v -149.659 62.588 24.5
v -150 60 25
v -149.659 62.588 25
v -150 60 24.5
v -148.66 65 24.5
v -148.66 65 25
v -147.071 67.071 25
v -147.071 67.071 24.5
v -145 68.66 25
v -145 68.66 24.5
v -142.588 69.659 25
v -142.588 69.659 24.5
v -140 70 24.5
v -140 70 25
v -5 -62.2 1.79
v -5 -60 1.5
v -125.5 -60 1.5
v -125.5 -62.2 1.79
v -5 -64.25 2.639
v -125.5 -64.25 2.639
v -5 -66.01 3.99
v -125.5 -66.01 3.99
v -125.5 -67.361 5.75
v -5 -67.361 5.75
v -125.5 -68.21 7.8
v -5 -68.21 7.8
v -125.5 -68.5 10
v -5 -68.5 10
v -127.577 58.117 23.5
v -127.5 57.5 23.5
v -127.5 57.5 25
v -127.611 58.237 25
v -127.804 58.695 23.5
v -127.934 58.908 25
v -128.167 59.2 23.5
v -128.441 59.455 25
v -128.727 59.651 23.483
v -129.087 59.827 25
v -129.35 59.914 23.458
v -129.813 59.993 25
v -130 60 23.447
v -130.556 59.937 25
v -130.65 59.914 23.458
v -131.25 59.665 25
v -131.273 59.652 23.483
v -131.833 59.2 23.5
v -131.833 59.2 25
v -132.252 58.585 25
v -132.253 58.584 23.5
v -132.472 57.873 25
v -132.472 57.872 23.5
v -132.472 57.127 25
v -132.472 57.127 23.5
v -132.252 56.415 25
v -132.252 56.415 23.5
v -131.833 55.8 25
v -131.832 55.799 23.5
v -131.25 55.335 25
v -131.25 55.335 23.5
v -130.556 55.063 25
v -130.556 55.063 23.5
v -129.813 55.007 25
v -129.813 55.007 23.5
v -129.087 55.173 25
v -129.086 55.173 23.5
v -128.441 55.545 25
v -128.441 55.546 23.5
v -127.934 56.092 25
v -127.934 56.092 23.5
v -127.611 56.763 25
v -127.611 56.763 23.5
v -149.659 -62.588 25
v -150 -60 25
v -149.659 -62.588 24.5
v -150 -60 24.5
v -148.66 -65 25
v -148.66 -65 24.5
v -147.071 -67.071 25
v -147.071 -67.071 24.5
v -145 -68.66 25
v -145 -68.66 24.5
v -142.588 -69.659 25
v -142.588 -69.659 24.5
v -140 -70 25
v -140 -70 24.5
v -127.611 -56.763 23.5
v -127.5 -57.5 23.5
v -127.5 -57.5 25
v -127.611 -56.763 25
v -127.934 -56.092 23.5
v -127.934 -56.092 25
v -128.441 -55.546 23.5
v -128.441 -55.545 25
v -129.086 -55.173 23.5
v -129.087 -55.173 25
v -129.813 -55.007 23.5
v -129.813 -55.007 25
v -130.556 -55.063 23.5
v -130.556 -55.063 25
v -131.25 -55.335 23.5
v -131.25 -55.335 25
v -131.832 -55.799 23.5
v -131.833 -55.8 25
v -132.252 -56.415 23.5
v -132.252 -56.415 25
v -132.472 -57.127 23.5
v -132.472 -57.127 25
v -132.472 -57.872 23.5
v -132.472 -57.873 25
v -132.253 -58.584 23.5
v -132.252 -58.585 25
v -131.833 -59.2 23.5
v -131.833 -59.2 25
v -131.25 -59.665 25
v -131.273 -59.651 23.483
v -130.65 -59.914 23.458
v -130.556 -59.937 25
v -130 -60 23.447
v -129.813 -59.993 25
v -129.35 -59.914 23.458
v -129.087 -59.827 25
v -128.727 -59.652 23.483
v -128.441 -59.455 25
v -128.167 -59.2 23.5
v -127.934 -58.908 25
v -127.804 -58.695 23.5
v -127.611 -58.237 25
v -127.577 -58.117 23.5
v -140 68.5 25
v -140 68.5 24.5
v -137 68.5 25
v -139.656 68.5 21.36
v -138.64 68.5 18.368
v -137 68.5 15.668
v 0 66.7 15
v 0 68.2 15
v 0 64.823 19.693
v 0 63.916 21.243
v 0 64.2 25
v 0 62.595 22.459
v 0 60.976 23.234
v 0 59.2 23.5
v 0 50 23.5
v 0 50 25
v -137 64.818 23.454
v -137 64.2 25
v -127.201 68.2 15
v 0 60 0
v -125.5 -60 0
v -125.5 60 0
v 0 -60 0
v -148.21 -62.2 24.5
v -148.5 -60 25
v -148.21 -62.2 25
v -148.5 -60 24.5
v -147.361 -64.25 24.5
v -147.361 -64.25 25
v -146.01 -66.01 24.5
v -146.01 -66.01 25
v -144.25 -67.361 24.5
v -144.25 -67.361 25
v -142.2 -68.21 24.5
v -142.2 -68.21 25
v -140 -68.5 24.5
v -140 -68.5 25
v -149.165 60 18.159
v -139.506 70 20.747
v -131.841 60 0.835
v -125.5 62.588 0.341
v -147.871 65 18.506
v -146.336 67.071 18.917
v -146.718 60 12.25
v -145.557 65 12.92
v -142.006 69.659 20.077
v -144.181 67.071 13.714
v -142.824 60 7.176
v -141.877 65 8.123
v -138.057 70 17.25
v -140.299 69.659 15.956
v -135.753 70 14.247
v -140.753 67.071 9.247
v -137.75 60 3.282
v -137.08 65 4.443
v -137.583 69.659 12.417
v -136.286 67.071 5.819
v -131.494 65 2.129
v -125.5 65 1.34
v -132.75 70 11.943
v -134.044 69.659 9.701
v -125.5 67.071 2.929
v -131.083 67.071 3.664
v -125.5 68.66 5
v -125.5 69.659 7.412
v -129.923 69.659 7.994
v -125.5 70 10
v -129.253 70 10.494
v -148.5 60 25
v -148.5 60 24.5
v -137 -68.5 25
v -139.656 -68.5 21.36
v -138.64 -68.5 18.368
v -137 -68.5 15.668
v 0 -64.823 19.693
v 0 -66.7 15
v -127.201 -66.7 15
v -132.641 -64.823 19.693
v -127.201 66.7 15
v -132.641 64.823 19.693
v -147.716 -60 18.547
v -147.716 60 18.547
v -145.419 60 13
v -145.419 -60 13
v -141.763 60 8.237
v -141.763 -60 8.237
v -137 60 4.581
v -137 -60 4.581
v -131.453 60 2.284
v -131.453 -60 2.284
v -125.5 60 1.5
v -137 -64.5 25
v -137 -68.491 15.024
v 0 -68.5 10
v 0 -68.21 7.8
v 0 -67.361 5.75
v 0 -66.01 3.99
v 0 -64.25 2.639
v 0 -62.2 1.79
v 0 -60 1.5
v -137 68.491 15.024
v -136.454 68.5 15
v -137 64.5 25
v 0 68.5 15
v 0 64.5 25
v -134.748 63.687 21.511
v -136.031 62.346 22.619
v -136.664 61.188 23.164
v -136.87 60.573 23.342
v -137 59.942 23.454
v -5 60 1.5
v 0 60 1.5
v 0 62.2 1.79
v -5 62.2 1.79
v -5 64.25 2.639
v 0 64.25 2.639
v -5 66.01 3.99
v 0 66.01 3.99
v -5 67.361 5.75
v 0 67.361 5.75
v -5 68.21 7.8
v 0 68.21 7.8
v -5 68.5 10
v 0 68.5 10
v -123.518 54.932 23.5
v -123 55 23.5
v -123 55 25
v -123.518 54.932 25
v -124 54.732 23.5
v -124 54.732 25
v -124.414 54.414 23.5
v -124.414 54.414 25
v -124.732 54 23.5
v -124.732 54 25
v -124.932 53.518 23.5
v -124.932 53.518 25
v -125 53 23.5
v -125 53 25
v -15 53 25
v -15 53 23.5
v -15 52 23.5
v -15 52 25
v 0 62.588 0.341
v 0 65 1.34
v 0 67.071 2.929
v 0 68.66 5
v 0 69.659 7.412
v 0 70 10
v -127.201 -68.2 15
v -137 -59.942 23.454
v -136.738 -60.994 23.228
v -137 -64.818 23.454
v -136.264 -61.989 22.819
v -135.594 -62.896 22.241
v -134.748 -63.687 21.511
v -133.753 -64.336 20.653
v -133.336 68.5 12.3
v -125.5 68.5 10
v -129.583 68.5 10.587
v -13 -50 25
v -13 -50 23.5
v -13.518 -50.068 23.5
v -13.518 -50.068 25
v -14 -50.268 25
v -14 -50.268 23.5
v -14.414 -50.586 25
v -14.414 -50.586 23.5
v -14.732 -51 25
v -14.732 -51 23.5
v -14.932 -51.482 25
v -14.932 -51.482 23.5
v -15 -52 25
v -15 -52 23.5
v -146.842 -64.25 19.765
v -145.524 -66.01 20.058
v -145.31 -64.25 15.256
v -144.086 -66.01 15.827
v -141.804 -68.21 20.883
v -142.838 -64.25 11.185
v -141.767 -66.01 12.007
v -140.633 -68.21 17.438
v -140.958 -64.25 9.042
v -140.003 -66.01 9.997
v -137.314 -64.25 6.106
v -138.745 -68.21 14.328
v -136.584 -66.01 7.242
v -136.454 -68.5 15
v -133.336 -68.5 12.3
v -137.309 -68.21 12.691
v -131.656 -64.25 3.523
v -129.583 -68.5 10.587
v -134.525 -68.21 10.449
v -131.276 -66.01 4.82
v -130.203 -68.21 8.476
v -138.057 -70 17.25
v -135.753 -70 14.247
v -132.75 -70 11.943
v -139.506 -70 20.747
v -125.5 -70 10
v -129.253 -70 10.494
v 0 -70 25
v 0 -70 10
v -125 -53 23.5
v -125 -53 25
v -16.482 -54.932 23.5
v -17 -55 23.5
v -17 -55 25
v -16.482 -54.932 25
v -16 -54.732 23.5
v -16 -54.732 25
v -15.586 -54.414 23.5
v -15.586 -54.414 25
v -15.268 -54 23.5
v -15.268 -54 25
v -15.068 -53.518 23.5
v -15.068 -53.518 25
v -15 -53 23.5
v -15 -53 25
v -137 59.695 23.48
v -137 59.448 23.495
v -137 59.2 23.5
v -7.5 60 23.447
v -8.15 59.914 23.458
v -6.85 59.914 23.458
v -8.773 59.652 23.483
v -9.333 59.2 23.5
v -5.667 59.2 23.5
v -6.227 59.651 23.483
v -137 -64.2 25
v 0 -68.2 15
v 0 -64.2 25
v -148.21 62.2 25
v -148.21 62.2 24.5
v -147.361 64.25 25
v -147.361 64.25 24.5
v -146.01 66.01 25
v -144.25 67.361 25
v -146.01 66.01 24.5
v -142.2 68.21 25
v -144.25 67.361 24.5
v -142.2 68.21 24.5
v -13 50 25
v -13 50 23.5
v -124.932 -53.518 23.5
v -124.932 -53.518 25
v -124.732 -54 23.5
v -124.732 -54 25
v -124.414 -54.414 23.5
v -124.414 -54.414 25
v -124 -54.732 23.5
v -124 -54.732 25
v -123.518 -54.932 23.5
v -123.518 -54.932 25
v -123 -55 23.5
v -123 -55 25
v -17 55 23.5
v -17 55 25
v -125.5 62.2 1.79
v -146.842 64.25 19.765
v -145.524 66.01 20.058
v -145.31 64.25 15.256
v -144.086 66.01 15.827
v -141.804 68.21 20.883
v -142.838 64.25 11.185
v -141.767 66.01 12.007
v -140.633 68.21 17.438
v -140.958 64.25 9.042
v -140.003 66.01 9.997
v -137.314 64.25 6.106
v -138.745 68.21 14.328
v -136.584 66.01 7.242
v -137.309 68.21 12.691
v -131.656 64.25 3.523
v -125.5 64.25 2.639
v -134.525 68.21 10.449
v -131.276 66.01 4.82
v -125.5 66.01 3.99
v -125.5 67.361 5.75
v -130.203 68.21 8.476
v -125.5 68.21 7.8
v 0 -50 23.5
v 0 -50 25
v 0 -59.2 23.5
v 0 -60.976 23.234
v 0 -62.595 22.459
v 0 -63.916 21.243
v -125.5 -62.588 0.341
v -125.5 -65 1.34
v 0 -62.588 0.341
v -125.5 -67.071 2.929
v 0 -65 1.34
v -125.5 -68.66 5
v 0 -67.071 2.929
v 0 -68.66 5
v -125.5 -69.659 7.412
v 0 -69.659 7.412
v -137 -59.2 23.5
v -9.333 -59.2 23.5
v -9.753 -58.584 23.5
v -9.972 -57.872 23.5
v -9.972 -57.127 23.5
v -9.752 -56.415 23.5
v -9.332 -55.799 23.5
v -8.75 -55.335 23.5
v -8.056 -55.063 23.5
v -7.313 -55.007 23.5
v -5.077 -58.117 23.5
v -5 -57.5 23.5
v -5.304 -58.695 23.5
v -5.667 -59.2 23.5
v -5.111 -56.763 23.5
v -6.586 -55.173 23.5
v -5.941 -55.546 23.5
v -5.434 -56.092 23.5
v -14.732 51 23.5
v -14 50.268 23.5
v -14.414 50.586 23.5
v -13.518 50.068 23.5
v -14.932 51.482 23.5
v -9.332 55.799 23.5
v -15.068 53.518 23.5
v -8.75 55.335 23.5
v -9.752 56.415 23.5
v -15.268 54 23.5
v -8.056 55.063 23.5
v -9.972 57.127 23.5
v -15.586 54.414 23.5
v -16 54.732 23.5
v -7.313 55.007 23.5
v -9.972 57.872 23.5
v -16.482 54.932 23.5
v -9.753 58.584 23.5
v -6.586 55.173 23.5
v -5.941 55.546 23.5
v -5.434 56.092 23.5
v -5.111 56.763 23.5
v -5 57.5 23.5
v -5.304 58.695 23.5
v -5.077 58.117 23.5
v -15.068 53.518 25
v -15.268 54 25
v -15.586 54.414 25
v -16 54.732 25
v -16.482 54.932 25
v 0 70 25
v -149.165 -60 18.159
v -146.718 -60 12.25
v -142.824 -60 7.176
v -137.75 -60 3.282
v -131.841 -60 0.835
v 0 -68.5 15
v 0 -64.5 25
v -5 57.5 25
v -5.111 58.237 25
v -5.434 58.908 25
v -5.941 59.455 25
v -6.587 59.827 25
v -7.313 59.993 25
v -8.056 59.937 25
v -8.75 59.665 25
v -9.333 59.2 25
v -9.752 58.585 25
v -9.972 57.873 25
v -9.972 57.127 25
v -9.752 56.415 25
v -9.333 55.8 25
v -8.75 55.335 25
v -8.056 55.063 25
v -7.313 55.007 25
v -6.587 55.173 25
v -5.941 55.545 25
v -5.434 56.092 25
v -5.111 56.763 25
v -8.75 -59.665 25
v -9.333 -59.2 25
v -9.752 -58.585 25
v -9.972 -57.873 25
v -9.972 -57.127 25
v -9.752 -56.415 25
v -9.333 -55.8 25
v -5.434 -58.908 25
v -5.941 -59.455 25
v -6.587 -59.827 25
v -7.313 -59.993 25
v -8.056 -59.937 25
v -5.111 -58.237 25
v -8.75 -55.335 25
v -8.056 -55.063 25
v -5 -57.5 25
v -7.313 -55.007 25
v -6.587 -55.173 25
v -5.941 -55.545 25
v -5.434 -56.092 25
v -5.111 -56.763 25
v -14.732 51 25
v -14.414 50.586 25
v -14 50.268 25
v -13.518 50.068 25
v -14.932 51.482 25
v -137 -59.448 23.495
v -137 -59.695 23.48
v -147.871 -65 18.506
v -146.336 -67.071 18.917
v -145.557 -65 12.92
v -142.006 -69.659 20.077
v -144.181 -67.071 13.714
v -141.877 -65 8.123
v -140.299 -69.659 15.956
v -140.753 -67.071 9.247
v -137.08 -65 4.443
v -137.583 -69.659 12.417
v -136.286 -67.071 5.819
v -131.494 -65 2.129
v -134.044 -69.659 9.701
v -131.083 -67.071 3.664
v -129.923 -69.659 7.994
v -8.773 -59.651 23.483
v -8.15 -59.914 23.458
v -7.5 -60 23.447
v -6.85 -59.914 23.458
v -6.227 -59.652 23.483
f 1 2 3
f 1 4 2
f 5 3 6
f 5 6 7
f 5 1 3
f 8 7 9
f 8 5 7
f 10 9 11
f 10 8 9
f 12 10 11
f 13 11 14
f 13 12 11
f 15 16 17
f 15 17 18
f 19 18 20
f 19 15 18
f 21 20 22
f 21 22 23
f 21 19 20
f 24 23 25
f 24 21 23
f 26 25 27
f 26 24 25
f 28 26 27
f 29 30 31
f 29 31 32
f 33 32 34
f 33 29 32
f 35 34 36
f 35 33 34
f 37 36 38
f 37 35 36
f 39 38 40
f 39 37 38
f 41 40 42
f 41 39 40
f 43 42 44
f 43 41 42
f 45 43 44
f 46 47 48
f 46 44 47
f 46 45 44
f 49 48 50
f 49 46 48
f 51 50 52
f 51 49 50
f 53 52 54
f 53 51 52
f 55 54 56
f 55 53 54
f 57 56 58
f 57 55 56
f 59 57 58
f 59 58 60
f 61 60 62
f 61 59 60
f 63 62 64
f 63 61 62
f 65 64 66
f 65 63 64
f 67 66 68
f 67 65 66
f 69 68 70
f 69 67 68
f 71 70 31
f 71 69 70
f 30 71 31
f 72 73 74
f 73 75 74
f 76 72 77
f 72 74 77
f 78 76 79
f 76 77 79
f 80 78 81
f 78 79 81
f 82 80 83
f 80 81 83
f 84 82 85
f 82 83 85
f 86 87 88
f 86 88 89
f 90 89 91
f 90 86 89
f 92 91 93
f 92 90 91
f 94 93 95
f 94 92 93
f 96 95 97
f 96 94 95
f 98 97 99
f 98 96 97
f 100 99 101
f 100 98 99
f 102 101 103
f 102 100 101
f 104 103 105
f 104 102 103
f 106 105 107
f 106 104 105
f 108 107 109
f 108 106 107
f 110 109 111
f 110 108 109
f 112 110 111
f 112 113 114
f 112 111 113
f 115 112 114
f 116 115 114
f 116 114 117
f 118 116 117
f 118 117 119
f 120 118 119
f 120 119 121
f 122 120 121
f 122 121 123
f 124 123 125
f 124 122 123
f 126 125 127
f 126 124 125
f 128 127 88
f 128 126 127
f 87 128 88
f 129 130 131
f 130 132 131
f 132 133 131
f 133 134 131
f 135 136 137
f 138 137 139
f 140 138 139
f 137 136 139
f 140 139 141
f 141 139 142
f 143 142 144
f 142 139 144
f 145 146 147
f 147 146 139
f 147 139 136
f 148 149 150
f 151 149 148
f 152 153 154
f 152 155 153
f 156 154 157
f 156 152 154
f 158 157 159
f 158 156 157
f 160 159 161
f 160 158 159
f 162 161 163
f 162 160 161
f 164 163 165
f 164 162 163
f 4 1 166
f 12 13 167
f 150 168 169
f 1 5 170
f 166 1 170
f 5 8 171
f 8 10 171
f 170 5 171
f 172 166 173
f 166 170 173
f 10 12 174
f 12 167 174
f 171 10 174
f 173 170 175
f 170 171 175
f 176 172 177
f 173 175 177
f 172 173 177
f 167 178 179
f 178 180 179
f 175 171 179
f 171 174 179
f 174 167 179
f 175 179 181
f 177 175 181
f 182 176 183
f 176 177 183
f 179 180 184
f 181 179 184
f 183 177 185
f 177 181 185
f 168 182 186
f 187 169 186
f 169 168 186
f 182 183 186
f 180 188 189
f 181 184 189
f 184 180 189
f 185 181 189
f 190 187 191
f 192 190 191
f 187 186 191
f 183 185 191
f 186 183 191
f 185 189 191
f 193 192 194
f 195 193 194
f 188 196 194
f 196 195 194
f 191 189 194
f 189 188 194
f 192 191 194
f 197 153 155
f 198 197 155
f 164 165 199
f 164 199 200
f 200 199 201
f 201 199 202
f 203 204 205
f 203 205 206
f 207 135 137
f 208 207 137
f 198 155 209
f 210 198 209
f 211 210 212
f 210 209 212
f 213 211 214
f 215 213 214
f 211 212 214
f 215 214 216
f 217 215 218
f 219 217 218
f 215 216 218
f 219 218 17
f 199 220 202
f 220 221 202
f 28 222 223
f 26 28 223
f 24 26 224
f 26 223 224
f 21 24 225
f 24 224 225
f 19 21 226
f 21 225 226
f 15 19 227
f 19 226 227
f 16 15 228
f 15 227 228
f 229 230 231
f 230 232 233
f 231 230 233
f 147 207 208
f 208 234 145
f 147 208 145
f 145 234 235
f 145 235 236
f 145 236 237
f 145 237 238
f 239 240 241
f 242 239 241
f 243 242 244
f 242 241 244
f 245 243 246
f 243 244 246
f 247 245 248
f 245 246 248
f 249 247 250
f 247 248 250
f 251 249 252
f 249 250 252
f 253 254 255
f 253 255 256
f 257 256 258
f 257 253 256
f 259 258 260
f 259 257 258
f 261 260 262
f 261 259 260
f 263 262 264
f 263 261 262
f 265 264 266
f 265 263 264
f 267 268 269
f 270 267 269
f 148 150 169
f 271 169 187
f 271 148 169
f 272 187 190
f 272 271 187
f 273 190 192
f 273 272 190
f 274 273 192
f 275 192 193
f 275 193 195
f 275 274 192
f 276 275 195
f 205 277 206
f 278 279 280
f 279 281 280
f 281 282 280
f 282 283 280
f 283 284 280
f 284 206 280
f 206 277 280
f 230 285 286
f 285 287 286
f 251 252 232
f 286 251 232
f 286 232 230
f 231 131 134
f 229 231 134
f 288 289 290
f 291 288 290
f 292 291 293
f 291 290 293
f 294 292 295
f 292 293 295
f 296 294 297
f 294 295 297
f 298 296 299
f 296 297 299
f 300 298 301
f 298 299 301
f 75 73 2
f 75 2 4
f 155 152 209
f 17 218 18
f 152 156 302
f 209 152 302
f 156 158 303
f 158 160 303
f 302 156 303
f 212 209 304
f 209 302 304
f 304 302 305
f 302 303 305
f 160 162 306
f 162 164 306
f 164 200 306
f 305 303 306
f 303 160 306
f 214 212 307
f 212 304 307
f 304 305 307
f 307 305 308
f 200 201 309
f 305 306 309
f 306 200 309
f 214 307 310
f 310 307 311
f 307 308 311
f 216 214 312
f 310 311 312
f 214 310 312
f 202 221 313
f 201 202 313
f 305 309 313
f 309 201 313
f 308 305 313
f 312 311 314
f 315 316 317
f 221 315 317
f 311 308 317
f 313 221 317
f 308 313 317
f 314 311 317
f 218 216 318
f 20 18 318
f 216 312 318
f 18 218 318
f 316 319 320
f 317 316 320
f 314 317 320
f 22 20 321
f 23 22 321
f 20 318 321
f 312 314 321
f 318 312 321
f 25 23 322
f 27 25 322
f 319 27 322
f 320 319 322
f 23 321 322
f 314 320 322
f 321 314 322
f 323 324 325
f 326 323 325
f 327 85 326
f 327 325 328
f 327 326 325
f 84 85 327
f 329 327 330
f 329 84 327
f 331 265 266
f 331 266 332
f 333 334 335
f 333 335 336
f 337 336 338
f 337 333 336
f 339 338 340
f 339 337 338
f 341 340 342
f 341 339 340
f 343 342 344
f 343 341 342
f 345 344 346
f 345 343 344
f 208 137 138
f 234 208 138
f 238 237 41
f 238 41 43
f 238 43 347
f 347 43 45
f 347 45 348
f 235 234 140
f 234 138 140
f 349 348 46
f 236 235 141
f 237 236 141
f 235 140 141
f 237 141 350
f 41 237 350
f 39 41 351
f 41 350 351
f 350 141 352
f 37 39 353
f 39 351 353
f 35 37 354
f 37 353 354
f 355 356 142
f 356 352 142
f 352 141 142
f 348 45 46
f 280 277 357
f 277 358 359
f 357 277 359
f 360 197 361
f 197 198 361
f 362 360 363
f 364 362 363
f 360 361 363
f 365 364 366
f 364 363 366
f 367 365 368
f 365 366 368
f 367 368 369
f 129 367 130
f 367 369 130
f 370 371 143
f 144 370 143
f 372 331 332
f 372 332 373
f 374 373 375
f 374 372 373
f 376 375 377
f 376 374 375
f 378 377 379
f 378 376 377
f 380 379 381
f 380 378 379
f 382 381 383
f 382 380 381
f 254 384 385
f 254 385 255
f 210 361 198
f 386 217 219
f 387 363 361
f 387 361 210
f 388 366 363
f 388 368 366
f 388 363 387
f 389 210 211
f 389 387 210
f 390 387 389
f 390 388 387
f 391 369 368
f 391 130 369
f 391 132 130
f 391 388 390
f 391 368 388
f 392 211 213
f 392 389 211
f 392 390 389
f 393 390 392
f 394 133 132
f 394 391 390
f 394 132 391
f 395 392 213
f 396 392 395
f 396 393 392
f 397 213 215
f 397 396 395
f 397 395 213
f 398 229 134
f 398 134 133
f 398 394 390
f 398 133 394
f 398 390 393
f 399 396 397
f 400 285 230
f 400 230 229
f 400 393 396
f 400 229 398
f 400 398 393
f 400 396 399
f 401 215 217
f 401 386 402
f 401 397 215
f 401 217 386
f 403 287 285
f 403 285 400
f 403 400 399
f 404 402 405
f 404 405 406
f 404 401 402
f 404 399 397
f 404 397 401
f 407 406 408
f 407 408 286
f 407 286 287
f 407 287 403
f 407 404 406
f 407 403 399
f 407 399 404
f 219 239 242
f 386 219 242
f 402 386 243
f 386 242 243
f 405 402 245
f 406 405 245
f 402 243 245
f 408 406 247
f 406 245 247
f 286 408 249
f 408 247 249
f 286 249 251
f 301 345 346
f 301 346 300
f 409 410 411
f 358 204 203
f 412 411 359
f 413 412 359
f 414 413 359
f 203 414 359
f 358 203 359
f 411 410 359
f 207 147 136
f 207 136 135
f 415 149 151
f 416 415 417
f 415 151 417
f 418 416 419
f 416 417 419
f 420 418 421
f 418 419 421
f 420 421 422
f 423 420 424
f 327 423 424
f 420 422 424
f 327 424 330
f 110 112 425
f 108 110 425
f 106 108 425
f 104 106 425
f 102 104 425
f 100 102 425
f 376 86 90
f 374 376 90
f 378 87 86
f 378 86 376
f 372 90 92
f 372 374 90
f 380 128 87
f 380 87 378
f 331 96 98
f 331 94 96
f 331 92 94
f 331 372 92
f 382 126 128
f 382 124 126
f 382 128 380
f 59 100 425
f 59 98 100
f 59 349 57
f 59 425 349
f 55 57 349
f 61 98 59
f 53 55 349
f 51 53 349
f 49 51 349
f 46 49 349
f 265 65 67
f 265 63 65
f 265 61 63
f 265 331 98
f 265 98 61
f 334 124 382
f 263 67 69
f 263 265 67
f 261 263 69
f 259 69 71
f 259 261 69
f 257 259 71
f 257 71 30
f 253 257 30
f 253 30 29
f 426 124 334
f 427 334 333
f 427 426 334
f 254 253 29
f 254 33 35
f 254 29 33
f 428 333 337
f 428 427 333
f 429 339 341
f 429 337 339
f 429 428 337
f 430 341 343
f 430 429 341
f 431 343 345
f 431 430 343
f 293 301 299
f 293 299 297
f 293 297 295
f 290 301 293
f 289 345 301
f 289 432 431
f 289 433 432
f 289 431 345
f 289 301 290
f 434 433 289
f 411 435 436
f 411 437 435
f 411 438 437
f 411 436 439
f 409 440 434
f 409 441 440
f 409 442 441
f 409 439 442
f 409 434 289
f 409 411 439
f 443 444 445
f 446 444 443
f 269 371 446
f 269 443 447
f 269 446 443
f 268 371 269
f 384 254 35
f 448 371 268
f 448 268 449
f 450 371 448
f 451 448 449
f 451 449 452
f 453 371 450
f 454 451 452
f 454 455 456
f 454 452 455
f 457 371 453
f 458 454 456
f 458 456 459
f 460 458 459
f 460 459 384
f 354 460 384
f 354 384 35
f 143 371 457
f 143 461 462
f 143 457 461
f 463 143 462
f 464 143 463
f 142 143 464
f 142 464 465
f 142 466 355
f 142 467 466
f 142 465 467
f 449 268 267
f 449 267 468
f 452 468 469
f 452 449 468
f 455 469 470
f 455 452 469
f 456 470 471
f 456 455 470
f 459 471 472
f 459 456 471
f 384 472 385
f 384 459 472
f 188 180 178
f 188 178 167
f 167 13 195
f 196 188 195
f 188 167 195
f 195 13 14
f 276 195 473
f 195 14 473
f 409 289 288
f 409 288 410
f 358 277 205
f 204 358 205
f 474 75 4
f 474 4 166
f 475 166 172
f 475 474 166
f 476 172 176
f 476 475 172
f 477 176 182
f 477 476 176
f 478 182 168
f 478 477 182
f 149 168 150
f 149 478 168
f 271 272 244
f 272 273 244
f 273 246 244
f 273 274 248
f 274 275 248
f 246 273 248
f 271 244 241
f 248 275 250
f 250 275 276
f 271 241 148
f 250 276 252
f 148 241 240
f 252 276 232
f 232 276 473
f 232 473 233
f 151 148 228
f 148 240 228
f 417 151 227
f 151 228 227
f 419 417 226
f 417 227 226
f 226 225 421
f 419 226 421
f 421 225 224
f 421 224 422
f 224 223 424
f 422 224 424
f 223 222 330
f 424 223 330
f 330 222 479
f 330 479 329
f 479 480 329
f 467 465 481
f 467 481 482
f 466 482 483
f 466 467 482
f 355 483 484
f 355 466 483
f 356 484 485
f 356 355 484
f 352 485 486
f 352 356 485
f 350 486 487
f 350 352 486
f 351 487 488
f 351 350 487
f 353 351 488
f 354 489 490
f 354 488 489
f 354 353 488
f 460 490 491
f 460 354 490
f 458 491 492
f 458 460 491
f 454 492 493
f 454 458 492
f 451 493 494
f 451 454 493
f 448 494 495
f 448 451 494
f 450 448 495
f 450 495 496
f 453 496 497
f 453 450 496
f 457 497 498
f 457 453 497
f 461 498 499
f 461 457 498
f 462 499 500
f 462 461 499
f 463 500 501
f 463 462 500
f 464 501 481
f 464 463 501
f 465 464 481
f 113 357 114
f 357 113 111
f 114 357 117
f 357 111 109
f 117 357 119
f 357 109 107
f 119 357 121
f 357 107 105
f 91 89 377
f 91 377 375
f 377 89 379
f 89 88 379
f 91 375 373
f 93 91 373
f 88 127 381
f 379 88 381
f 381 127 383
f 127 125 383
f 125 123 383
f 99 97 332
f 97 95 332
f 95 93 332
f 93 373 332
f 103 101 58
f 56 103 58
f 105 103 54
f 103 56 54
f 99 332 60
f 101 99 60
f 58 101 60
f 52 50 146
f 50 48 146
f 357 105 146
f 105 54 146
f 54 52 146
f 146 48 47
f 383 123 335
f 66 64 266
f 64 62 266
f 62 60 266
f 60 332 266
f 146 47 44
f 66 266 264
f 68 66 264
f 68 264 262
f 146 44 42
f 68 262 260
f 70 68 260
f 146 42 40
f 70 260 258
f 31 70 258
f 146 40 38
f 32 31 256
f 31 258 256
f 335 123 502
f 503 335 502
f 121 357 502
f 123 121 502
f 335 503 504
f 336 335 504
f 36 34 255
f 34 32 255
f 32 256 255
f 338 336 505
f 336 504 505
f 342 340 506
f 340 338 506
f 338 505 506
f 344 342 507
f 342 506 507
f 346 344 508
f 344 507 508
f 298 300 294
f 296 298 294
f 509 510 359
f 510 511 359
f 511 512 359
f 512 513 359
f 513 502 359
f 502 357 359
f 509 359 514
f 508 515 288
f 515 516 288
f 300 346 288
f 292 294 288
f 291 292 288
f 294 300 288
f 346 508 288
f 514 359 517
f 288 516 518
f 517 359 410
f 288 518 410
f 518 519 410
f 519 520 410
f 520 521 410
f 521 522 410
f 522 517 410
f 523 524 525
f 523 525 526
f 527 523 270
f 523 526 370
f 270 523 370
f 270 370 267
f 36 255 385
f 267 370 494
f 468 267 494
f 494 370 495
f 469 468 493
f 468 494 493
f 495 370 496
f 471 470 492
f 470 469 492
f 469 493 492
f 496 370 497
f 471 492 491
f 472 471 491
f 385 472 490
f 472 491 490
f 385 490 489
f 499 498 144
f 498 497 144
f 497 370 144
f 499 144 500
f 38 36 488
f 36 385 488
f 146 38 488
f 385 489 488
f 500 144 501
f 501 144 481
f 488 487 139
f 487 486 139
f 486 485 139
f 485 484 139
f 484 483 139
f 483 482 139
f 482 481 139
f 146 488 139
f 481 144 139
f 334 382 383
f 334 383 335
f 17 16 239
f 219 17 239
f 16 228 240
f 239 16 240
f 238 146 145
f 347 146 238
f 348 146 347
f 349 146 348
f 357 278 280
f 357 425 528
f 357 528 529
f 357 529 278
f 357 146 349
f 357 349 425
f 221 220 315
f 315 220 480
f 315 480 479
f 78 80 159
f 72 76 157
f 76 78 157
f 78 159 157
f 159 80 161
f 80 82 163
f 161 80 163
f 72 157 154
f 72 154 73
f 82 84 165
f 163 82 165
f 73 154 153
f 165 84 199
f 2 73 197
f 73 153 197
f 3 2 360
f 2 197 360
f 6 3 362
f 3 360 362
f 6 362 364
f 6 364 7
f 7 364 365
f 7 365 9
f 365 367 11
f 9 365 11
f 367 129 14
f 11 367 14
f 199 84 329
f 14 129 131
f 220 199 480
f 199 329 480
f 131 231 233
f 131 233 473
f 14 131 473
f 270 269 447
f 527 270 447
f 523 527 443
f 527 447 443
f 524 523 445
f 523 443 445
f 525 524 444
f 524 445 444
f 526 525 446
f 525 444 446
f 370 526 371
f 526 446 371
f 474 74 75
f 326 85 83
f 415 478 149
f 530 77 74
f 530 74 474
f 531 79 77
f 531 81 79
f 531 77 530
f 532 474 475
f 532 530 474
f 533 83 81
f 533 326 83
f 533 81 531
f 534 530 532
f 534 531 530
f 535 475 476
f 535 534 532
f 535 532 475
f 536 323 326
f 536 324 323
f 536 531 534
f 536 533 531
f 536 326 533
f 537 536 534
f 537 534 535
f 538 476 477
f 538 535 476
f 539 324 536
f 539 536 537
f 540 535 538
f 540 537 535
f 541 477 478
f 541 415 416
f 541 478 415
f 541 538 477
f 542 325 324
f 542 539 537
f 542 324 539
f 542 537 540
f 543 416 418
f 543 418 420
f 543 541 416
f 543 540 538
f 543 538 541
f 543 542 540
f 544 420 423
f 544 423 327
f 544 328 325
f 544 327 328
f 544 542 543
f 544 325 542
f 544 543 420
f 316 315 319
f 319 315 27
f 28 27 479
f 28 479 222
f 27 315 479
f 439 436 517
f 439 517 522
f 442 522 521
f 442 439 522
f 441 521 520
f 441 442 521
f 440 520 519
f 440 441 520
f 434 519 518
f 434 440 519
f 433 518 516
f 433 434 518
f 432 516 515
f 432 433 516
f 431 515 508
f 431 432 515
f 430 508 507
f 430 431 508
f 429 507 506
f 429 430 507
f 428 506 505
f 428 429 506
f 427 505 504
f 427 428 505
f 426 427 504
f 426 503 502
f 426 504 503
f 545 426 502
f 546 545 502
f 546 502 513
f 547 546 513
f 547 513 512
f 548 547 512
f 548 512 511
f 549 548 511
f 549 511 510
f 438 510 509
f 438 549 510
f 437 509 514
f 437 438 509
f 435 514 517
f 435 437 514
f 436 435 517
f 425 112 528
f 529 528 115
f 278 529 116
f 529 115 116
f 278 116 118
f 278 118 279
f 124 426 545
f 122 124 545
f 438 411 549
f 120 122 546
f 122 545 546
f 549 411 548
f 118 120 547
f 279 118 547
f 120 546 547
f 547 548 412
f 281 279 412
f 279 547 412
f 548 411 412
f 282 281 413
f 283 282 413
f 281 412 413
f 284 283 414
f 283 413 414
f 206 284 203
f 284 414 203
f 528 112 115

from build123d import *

# Parameters (mm, degrees)
PAD_DEPTH       = 70
FILLET_R        = 10
THICKNESS_T     = -1.5
SKETCH001_W     = 120
SKETCH001_H     = 25
POCKET_DEPTH    = 5
POCKET001_DEPTH = 5
PAD001_DEPTH    = 137
PAD002_DEPTH    = 137
POCKET002_DEPTH = 31
SKETCH007_R     = 2.5
POCKET003_DEPTH = 30
POCKET004_DEPTH = 100


with BuildPart() as body:
    # Sketch (on XZ_Plane of Origin) → Pad (new body, symmetric)
    with BuildSketch(Plane.XZ):
        with BuildLine():
            Line((0, 0), (0, 25))
            Line((0, 25), (-150, 25))
            Line((-150, 25), (-150, 24.5))
            ThreePointArc((-150, 24.5), (-142.824116, 7.175884), (-125.5, 0))
            Line((-125.5, 0), (0, 0))
        make_face()
    extrude(amount=PAD_DEPTH, both=True)

    # Fillet
    fillet_edges = [body.edges().sort_by_distance(p)[0] for p in [
        (-62.75, -70, 0),
        (-62.75, 70, 0),
    ]]
    fillet(fillet_edges, radius=FILLET_R)

    # Thickness
    thickness_openings = [body.faces().sort_by_distance(p)[0] for p in [
        (-74.850974, 0, 25),
    ]]
    offset(amount=THICKNESS_T, openings=thickness_openings)

    # Sketch001 → Pocket (cut)
    with BuildSketch(Plane.YZ):
        with Locations((0, 14)):
            Rectangle(SKETCH001_W, SKETCH001_H)
    extrude(amount=-POCKET_DEPTH, mode=Mode.SUBTRACT)

    # Sketch002 (on YZ_Plane of Origin) → Pocket001 (cut)
    with BuildSketch(Plane.YZ):
        with BuildLine():
            Line((-68.5, 26.5), (-68.5, 10))
            ThreePointArc((-68.5, 10), (-66.010408, 3.989592), (-60, 1.5))
            Line((-60, 1.5), (60, 1.5))
            ThreePointArc((60, 1.5), (66.010408, 3.989592), (68.5, 10))
            Line((68.5, 10), (68.5, 26.5))
            Line((68.5, 26.5), (-68.5, 26.5))
        make_face()
    extrude(amount=-POCKET001_DEPTH, mode=Mode.SUBTRACT)

    # Sketch004 → Pad001 (join)
    with BuildSketch(Plane.YZ):
        Polygon((-68.5, 25), (-64.5, 25), (-68.5, 15), align=None)
        Polygon((64.5, 25), (68.5, 25), (68.5, 15), align=None)
    extrude(amount=-PAD001_DEPTH)


with BuildPart() as mount:
    # Sketch005 (on YZ_Plane001 of Origin002) → Pad002 (new body)
    with BuildSketch(Plane.YZ):
        with BuildLine():
            Line((-68.2, 15), (-64.2, 25))
            Line((-64.2, 25), (-54.2, 25))
            Line((-54.2, 25), (54.2, 25))
            Line((54.2, 25), (64.2, 25))
            Line((64.2, 25), (68.2, 15))
            Line((68.2, 15), (66.7, 15))
            Line((66.7, 15), (64.822702, 19.693246))
            ThreePointArc((64.822702, 19.693246), (62.595076, 22.458803), (59.2, 23.5))
            Line((59.2, 23.5), (54.2, 23.5))
            Line((-54.2, 23.5), (54.2, 23.5))
            Line((-54.2, 23.5), (-59.2, 23.5))
            ThreePointArc((-59.2, 23.5), (-62.595076, 22.458803), (-64.822702, 19.693246))
            Line((-66.7, 15), (-64.822702, 19.693246))
            Line((-68.2, 15), (-66.7, 15))
        make_face()
    extrude(amount=-PAD002_DEPTH)

    # Sketch006 (on XY_Plane001 of Origin002) → Pocket002 (cut)
    with BuildSketch(Plane.XY):
        with BuildLine():
            Line((-17, 55), (-123, 55))
            ThreePointArc((-123, 55), (-124.414214, 54.414214), (-125, 53))
            Line((-125, 53), (-125, -53))
            ThreePointArc((-125, -53), (-124.414214, -54.414214), (-123, -55))
            Line((-123, -55), (-17, -55))
            ThreePointArc((-17, -55), (-15.585786, -54.414214), (-15, -53))
            Line((-15, -53), (-15, -52))
            ThreePointArc((-13, -50), (-14.414214, -50.585786), (-15, -52))
            Line((-13, -50), (0, -50))
            Line((0, -50), (0, 50))
            Line((-13, 50), (0, 50))
            ThreePointArc((-15, 52), (-14.414214, 50.585786), (-13, 50))
            Line((-15, 53), (-15, 52))
            ThreePointArc((-15, 53), (-15.585786, 54.414214), (-17, 55))
        make_face()
    extrude(amount=POCKET002_DEPTH, mode=Mode.SUBTRACT)

    # Sketch007 (on XY_Plane001 of Origin002) → Pocket003 (cut)
    with BuildSketch(Plane.XY):
        with Locations((-7.5, 57.5)):
            Circle(SKETCH007_R)
        with Locations((-130, 57.5)):
            Circle(SKETCH007_R)
        with Locations((-7.5, -57.5)):
            Circle(SKETCH007_R)
        with Locations((-130, -57.5)):
            Circle(SKETCH007_R)
    extrude(amount=POCKET003_DEPTH, mode=Mode.SUBTRACT)

    # Sketch008 (on XZ_Plane001 of Origin002) → Pocket004 (cut, symmetric)
    with BuildSketch(Plane.XZ):
        Polygon((-137.213166, 23.638279), (-139.775239, 10.189935), (-126.847595, 14.695286), align=None)
    extrude(amount=POCKET004_DEPTH, both=True, mode=Mode.SUBTRACT)


solid = Compound([body.part, mount.part])
